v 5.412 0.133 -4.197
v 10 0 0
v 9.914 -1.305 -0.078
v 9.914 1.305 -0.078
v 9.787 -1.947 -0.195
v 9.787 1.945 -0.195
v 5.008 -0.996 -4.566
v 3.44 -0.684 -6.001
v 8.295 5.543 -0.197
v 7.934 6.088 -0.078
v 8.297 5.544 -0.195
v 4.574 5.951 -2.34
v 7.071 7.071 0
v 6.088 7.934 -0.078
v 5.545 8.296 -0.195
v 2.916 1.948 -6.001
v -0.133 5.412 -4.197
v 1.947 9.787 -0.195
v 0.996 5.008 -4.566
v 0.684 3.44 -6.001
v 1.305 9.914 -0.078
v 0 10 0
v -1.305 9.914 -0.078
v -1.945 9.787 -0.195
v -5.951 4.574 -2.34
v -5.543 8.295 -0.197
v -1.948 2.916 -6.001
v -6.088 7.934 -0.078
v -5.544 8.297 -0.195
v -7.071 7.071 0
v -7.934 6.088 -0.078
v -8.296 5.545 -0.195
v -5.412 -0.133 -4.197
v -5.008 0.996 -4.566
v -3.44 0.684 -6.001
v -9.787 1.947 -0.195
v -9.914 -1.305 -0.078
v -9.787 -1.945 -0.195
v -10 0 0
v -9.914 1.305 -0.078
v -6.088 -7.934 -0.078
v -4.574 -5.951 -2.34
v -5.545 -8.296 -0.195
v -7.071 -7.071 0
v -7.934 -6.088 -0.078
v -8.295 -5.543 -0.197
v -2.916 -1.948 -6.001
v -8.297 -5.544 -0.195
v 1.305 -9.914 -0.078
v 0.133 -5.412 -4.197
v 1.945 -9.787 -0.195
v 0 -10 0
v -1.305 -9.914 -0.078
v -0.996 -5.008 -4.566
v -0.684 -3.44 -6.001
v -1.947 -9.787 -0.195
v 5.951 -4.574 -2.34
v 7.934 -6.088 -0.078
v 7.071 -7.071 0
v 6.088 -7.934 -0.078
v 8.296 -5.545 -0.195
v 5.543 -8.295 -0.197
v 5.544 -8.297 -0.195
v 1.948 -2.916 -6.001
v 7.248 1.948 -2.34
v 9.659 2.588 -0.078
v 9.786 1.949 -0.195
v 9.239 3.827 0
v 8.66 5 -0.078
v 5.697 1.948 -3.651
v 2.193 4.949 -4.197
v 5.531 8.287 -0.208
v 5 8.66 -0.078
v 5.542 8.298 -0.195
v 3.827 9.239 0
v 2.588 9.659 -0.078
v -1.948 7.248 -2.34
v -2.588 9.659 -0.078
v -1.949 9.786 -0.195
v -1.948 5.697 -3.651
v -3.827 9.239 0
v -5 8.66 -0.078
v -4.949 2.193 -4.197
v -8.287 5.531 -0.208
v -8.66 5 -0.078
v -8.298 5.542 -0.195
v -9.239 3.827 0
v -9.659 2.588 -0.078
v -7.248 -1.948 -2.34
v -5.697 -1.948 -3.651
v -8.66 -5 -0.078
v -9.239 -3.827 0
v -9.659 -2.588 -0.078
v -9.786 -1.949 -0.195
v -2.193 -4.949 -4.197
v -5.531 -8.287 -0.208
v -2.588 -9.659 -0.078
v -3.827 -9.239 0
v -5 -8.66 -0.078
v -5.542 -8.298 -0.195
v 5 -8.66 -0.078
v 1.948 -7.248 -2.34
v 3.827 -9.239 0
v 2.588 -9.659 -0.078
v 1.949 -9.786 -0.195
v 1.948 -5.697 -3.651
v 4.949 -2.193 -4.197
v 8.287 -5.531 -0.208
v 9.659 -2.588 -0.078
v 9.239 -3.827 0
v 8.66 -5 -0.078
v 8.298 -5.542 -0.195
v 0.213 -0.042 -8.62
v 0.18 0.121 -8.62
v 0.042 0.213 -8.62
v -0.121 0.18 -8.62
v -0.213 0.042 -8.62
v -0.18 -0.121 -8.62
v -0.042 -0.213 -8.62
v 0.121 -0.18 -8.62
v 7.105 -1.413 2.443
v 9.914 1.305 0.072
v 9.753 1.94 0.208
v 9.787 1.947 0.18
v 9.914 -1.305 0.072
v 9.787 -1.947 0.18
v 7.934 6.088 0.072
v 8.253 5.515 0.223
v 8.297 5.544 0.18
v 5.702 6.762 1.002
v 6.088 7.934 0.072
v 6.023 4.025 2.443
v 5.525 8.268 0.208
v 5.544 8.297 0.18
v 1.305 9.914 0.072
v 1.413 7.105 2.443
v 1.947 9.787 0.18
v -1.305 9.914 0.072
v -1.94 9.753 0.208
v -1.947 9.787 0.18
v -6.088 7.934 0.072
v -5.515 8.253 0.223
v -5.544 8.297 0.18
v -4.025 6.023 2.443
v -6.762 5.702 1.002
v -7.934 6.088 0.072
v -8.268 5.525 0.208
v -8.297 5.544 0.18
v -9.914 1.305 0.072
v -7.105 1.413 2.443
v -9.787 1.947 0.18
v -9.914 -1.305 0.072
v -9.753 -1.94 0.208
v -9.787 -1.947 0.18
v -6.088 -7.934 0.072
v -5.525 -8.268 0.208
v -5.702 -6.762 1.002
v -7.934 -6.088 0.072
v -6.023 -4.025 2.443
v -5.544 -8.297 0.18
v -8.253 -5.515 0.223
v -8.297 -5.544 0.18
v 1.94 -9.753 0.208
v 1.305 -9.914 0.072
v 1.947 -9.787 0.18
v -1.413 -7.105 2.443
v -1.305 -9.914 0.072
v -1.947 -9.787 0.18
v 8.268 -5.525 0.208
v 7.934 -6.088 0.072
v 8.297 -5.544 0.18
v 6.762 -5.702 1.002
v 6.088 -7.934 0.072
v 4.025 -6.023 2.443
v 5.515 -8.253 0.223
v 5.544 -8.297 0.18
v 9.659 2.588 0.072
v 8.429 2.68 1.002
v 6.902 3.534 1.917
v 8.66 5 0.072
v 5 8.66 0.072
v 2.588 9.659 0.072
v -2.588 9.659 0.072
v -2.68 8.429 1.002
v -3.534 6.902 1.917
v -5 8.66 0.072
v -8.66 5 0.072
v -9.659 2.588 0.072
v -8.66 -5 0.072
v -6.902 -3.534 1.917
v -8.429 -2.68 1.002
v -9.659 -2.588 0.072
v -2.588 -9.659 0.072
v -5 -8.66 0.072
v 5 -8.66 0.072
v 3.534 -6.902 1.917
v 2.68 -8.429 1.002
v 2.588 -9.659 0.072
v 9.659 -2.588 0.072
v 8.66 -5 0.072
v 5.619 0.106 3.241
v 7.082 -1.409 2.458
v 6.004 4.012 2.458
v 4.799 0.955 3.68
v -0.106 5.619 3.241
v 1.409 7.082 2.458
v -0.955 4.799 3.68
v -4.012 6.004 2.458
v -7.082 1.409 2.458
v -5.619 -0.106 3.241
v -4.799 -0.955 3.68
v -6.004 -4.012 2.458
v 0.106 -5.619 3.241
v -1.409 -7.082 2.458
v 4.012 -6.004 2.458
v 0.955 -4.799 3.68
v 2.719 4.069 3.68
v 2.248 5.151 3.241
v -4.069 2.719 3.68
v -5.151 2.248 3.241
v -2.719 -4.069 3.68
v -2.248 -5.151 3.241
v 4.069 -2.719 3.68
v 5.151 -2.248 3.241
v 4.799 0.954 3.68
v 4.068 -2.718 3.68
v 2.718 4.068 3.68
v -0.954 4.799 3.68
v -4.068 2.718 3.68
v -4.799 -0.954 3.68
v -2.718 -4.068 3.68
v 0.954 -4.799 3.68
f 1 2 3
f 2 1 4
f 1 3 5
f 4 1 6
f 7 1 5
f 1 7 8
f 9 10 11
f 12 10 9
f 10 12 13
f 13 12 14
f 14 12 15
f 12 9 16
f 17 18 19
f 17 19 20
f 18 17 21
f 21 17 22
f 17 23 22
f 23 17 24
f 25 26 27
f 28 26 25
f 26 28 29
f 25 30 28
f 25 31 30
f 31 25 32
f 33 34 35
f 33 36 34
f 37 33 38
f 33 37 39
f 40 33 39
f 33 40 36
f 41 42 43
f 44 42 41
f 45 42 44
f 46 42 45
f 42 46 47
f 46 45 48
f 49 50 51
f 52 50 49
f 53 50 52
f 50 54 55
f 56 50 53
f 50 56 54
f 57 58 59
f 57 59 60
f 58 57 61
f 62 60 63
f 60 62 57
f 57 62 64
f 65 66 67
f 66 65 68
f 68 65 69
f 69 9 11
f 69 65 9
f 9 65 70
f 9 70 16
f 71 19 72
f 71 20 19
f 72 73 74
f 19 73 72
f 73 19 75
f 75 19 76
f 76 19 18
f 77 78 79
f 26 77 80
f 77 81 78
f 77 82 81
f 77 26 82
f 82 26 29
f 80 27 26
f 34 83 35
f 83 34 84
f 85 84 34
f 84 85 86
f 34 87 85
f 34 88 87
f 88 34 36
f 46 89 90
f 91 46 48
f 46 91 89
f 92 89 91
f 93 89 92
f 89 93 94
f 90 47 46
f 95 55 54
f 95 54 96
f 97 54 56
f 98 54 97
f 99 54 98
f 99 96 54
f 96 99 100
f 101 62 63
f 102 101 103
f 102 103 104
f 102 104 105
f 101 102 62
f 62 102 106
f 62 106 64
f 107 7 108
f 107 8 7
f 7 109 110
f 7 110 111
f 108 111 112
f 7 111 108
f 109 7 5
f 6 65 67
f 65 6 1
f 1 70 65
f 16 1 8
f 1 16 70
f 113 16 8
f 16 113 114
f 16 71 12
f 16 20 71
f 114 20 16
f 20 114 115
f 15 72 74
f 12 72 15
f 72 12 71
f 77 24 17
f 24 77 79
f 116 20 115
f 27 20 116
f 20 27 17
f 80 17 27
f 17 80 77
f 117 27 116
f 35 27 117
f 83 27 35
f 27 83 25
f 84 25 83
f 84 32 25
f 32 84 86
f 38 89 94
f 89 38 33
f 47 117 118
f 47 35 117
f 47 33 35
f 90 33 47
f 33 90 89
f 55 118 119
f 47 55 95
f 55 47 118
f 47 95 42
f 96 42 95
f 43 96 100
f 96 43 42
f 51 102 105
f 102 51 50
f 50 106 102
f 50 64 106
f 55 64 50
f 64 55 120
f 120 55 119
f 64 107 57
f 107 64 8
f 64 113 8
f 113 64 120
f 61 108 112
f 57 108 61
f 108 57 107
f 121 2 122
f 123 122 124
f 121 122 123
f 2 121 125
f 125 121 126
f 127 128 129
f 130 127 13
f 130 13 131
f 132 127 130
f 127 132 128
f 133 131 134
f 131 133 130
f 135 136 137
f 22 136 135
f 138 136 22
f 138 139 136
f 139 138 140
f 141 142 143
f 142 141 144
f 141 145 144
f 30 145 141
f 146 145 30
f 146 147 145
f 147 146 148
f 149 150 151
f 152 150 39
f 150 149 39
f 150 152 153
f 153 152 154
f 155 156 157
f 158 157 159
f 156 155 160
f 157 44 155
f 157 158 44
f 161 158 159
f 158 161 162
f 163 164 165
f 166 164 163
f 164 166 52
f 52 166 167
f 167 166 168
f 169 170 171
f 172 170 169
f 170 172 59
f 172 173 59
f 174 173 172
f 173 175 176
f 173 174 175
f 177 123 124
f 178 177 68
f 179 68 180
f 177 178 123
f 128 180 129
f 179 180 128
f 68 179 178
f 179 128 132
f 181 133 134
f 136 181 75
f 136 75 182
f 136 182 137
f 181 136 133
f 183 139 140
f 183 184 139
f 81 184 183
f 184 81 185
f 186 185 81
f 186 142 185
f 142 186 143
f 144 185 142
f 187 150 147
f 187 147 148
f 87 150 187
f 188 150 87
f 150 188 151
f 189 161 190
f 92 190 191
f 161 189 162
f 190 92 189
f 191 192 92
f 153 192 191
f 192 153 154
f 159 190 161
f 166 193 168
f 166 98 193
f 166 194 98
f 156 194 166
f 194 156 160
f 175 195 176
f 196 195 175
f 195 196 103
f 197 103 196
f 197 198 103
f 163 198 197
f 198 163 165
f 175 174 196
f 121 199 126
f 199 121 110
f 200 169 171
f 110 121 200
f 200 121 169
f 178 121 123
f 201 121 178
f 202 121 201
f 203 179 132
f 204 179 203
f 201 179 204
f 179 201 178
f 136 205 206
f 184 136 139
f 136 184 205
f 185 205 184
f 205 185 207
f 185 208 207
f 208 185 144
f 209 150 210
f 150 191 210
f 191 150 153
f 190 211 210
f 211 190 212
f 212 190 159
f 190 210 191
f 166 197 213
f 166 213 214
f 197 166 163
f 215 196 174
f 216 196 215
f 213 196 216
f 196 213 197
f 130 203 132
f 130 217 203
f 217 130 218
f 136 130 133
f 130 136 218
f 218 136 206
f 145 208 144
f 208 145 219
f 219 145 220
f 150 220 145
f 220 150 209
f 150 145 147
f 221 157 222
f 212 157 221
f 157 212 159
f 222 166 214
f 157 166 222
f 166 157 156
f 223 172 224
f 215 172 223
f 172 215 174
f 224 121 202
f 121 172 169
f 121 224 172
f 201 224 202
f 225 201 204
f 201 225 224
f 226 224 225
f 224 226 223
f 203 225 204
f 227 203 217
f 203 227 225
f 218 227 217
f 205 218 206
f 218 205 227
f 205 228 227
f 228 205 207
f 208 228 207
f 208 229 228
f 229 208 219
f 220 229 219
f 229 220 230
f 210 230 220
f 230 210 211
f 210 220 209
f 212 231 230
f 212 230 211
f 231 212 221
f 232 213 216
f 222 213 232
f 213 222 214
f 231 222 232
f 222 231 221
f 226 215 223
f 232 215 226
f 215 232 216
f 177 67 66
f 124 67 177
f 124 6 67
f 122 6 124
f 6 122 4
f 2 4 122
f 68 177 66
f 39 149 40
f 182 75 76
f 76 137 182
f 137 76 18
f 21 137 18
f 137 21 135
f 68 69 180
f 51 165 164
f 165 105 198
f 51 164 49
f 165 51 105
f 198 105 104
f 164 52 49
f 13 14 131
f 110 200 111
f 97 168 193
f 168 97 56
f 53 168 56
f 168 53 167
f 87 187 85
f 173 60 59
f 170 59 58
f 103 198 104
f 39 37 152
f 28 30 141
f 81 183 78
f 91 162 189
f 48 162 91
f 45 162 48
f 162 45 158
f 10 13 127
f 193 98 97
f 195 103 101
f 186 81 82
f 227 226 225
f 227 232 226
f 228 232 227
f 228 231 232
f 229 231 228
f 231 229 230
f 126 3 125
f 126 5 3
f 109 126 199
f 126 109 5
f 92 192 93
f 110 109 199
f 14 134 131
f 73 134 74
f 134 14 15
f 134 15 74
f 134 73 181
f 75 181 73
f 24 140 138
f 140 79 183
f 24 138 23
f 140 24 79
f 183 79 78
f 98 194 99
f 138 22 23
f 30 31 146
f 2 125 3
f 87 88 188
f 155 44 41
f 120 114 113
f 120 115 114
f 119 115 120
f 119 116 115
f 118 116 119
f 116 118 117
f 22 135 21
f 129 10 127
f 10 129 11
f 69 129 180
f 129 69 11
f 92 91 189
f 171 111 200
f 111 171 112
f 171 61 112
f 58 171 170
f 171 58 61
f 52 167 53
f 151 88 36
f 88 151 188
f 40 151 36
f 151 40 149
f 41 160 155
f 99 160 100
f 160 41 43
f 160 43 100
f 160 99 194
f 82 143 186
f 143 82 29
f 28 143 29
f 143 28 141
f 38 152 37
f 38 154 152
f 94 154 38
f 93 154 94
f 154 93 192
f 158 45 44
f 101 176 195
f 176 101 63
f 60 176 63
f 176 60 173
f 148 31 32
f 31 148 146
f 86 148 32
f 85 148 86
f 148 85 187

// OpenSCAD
// [FL_INDEX: keywords="openscad, 3d_parametric, Diamond_shape__Brilliant_cut_58, csg_solid" | COT="Parametric OpenSCAD design from 3DCodeverse"]
// Title: Diamond shape, Brilliant cut 58

module sea_urchin()
difine();
//valiable data

//Diamond_size_d
dd=20;//[10:40]

//Diamond_hight_retio
hr=0.615;

// ignore variable values
pag1=42.45*1;//Pavillion_angle1
pag2=40.75*1;////Pavillion_angle2
cag3=40.16*1;////Crown_angle3
cag4=34.5*1;////Crown_angle4
cag5=24.35*1;////Crown_angle4
dh=dd*hr;//Diamond_hight_retio

difference() {
			translate([0,0,-dd*0.431])cylinder(h=dh,r=dd/2,$fn=48);	
union(){
	for (i = [ 0 : 8-1] ) {
				rotate([0,0,360/8*i]) translate([dd/2,0,-5/cos(pag1)]) rotate([0,90-pag1,0])cube(size=[dd/2,dd/2,1.1*dd], center=true);
							}
for (i = [ 0 : 8-1] ) {
				rotate([0,0,360/8*i+22.5]) translate([dd/2,0,-5/cos(pag1)]) rotate([0,90-pag1,0])cube(size=[dd/2,dd/2,1.1*dd], center=true);
							}
	for (i = [ 0 : 8-1] ) {
				rotate([0,0,360/8*i+11.25]) translate([dd/2,0,-5/cos(pag1)]) rotate([0,90-pag2,0])cube(size=[dd/2,dd/2,dd], center=true);
							}
}
union(){
	for (i = [ 0 : 8-1] ) {
		rotate([0,0,360/8*i]) translate([dd/2,0,5/cos(cag3)]) rotate([0,90-cag3,180])cube(size=[dd/2,dd/2,dd], center=true);
							}
for (i = [ 0 : 8-1] ) {
		rotate([0,0,360/8*i+22.5]) translate([dd/2,0,5/cos(cag3)]) rotate([0,90-cag3,180])cube(size=[dd/2,dd/2,dd], center=true);
							}
}
union(){
	for (i = [ 0 : 4-1] ) {
		rotate([0,0,360/4*i+11.25]) translate([dd/2,0,5/cos(cag4)+0.0085*dd]) rotate([0,90-cag4,180])cube(size=[dd/2,dd/2,dd], center=true);
							}
for (i = [ 0 : 4-1] ) {
		rotate([0,0,360/4*i+11.25+45]) translate([dd/2,0,5/cos(cag4)+0.0085*dd]) rotate([0,90-cag4,180])cube(size=[dd/2,dd/2,dd], center=true);
							}
	for (i = [ 0 : 8-1] ) {
	rotate([0,0,360/8*i-11.25]) translate([dd/2,0,5/cos(cag5)+0.060*dd]) rotate([0,90-cag5,180])cube(size=[dd/2,dd/2,dd], center=true);
							}
		}
			}
module sea_urchin();



	
